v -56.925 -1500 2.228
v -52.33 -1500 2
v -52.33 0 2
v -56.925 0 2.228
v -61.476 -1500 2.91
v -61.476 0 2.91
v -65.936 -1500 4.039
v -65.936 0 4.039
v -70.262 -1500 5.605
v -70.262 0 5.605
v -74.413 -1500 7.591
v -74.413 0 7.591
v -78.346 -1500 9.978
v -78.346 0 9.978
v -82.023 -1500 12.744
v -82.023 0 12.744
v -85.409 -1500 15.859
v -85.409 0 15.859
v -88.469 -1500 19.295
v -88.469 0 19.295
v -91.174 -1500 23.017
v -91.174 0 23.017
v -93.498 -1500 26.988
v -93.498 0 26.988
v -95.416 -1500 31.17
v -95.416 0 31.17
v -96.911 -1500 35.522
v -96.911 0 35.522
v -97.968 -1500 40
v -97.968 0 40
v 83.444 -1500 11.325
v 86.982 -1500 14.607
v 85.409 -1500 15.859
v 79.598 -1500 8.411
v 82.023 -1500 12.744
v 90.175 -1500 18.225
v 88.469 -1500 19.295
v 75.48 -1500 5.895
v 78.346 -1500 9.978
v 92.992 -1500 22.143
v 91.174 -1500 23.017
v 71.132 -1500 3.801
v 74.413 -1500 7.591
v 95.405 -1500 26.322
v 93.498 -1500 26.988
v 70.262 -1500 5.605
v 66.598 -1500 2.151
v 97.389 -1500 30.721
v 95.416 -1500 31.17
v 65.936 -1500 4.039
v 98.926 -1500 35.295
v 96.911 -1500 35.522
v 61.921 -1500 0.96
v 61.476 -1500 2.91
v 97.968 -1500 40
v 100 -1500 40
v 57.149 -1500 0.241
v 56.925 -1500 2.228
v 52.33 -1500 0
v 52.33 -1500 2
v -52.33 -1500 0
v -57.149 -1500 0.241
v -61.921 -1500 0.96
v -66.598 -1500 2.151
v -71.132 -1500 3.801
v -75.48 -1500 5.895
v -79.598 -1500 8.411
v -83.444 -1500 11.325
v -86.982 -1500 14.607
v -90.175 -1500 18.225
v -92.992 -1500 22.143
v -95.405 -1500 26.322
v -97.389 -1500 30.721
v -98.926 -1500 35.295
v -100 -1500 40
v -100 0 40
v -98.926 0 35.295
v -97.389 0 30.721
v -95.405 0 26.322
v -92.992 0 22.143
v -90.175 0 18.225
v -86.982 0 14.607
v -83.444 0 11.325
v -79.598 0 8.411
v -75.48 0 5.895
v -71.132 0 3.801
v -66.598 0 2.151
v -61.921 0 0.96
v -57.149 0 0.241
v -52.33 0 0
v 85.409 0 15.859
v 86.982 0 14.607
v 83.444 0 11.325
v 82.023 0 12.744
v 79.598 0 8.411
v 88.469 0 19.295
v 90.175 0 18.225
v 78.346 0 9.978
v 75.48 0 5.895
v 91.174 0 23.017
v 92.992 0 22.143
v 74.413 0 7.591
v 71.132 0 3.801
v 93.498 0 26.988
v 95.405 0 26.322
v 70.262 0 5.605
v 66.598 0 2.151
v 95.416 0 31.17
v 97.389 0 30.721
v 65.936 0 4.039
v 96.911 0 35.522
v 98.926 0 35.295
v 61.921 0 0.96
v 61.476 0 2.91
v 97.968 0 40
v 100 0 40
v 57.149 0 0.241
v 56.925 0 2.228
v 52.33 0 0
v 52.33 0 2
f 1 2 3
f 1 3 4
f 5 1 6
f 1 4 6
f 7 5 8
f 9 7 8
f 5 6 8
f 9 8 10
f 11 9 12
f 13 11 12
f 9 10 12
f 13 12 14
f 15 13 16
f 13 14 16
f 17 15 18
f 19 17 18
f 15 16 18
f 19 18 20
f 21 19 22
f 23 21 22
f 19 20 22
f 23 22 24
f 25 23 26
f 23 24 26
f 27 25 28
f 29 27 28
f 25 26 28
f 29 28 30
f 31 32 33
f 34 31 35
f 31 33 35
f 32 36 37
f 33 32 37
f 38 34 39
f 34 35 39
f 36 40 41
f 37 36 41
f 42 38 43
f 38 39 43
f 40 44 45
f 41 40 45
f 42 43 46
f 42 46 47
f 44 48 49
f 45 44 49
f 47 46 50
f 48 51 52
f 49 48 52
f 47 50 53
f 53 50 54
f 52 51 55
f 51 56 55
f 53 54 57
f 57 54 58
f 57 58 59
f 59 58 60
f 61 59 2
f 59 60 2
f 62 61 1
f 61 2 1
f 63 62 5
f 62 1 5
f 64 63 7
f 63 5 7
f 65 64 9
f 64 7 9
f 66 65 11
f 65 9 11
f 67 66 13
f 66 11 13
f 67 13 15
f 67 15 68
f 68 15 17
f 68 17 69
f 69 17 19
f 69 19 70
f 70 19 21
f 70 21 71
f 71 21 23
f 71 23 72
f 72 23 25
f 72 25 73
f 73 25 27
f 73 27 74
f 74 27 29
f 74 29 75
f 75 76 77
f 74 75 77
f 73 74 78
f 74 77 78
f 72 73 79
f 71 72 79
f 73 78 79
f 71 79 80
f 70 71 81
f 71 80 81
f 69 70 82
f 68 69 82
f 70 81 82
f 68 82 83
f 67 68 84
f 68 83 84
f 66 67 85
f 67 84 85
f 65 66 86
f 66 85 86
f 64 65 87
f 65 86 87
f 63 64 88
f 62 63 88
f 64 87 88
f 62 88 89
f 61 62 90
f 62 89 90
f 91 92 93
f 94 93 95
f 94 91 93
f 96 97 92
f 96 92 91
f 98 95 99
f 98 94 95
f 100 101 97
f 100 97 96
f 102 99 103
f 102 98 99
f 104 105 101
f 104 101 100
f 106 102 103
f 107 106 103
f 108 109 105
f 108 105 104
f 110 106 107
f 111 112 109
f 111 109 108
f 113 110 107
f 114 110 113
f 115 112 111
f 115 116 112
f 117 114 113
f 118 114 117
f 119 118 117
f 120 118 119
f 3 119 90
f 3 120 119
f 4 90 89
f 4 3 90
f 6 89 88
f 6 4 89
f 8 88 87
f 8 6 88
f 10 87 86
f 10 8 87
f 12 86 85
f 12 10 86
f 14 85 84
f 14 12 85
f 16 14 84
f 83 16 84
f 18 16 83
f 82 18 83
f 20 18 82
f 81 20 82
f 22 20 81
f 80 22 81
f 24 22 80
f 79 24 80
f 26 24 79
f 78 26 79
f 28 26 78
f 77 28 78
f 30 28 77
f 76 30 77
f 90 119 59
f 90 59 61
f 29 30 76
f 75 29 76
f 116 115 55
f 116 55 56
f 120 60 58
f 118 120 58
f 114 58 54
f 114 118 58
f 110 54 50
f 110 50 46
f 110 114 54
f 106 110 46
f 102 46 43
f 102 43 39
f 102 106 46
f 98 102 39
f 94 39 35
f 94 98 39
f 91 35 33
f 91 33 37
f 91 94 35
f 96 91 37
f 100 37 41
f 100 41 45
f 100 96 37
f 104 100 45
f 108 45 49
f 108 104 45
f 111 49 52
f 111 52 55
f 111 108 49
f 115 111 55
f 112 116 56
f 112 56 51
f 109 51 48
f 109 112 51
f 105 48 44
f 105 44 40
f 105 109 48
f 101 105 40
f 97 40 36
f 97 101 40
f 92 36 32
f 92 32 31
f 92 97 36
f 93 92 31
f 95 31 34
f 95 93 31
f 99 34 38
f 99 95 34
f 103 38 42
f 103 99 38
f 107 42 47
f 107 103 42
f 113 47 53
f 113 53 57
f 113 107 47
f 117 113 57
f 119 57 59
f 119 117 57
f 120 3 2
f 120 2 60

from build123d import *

# Parameters (mm, degrees)
F1_DEPTH = 1500


with BuildPart() as f1:
    # F0 (on Front) → F1 (new body)
    with BuildSketch(Plane.XZ):
        with BuildLine():
            Line((-52.329856, 0), (0, 0))
            Line((0, 0), (0, 2))
            Line((0, 2), (-52.329856, 2))
            ThreePointArc((-52.329856, 2), (-82.023376, 12.743672), (-97.967784, 40))
            Line((-97.967784, 40), (-100, 40))
            ThreePointArc((-100, 40), (-83.444333, 11.324743), (-52.329856, 0))
        make_face()
    extrude(amount=F1_DEPTH)

    # F2: F1 across plane


with BuildPart() as f1_1:
    add(f1.part)
    add(f1.part.mirror(Plane.YZ))


solid = f1_1.part
